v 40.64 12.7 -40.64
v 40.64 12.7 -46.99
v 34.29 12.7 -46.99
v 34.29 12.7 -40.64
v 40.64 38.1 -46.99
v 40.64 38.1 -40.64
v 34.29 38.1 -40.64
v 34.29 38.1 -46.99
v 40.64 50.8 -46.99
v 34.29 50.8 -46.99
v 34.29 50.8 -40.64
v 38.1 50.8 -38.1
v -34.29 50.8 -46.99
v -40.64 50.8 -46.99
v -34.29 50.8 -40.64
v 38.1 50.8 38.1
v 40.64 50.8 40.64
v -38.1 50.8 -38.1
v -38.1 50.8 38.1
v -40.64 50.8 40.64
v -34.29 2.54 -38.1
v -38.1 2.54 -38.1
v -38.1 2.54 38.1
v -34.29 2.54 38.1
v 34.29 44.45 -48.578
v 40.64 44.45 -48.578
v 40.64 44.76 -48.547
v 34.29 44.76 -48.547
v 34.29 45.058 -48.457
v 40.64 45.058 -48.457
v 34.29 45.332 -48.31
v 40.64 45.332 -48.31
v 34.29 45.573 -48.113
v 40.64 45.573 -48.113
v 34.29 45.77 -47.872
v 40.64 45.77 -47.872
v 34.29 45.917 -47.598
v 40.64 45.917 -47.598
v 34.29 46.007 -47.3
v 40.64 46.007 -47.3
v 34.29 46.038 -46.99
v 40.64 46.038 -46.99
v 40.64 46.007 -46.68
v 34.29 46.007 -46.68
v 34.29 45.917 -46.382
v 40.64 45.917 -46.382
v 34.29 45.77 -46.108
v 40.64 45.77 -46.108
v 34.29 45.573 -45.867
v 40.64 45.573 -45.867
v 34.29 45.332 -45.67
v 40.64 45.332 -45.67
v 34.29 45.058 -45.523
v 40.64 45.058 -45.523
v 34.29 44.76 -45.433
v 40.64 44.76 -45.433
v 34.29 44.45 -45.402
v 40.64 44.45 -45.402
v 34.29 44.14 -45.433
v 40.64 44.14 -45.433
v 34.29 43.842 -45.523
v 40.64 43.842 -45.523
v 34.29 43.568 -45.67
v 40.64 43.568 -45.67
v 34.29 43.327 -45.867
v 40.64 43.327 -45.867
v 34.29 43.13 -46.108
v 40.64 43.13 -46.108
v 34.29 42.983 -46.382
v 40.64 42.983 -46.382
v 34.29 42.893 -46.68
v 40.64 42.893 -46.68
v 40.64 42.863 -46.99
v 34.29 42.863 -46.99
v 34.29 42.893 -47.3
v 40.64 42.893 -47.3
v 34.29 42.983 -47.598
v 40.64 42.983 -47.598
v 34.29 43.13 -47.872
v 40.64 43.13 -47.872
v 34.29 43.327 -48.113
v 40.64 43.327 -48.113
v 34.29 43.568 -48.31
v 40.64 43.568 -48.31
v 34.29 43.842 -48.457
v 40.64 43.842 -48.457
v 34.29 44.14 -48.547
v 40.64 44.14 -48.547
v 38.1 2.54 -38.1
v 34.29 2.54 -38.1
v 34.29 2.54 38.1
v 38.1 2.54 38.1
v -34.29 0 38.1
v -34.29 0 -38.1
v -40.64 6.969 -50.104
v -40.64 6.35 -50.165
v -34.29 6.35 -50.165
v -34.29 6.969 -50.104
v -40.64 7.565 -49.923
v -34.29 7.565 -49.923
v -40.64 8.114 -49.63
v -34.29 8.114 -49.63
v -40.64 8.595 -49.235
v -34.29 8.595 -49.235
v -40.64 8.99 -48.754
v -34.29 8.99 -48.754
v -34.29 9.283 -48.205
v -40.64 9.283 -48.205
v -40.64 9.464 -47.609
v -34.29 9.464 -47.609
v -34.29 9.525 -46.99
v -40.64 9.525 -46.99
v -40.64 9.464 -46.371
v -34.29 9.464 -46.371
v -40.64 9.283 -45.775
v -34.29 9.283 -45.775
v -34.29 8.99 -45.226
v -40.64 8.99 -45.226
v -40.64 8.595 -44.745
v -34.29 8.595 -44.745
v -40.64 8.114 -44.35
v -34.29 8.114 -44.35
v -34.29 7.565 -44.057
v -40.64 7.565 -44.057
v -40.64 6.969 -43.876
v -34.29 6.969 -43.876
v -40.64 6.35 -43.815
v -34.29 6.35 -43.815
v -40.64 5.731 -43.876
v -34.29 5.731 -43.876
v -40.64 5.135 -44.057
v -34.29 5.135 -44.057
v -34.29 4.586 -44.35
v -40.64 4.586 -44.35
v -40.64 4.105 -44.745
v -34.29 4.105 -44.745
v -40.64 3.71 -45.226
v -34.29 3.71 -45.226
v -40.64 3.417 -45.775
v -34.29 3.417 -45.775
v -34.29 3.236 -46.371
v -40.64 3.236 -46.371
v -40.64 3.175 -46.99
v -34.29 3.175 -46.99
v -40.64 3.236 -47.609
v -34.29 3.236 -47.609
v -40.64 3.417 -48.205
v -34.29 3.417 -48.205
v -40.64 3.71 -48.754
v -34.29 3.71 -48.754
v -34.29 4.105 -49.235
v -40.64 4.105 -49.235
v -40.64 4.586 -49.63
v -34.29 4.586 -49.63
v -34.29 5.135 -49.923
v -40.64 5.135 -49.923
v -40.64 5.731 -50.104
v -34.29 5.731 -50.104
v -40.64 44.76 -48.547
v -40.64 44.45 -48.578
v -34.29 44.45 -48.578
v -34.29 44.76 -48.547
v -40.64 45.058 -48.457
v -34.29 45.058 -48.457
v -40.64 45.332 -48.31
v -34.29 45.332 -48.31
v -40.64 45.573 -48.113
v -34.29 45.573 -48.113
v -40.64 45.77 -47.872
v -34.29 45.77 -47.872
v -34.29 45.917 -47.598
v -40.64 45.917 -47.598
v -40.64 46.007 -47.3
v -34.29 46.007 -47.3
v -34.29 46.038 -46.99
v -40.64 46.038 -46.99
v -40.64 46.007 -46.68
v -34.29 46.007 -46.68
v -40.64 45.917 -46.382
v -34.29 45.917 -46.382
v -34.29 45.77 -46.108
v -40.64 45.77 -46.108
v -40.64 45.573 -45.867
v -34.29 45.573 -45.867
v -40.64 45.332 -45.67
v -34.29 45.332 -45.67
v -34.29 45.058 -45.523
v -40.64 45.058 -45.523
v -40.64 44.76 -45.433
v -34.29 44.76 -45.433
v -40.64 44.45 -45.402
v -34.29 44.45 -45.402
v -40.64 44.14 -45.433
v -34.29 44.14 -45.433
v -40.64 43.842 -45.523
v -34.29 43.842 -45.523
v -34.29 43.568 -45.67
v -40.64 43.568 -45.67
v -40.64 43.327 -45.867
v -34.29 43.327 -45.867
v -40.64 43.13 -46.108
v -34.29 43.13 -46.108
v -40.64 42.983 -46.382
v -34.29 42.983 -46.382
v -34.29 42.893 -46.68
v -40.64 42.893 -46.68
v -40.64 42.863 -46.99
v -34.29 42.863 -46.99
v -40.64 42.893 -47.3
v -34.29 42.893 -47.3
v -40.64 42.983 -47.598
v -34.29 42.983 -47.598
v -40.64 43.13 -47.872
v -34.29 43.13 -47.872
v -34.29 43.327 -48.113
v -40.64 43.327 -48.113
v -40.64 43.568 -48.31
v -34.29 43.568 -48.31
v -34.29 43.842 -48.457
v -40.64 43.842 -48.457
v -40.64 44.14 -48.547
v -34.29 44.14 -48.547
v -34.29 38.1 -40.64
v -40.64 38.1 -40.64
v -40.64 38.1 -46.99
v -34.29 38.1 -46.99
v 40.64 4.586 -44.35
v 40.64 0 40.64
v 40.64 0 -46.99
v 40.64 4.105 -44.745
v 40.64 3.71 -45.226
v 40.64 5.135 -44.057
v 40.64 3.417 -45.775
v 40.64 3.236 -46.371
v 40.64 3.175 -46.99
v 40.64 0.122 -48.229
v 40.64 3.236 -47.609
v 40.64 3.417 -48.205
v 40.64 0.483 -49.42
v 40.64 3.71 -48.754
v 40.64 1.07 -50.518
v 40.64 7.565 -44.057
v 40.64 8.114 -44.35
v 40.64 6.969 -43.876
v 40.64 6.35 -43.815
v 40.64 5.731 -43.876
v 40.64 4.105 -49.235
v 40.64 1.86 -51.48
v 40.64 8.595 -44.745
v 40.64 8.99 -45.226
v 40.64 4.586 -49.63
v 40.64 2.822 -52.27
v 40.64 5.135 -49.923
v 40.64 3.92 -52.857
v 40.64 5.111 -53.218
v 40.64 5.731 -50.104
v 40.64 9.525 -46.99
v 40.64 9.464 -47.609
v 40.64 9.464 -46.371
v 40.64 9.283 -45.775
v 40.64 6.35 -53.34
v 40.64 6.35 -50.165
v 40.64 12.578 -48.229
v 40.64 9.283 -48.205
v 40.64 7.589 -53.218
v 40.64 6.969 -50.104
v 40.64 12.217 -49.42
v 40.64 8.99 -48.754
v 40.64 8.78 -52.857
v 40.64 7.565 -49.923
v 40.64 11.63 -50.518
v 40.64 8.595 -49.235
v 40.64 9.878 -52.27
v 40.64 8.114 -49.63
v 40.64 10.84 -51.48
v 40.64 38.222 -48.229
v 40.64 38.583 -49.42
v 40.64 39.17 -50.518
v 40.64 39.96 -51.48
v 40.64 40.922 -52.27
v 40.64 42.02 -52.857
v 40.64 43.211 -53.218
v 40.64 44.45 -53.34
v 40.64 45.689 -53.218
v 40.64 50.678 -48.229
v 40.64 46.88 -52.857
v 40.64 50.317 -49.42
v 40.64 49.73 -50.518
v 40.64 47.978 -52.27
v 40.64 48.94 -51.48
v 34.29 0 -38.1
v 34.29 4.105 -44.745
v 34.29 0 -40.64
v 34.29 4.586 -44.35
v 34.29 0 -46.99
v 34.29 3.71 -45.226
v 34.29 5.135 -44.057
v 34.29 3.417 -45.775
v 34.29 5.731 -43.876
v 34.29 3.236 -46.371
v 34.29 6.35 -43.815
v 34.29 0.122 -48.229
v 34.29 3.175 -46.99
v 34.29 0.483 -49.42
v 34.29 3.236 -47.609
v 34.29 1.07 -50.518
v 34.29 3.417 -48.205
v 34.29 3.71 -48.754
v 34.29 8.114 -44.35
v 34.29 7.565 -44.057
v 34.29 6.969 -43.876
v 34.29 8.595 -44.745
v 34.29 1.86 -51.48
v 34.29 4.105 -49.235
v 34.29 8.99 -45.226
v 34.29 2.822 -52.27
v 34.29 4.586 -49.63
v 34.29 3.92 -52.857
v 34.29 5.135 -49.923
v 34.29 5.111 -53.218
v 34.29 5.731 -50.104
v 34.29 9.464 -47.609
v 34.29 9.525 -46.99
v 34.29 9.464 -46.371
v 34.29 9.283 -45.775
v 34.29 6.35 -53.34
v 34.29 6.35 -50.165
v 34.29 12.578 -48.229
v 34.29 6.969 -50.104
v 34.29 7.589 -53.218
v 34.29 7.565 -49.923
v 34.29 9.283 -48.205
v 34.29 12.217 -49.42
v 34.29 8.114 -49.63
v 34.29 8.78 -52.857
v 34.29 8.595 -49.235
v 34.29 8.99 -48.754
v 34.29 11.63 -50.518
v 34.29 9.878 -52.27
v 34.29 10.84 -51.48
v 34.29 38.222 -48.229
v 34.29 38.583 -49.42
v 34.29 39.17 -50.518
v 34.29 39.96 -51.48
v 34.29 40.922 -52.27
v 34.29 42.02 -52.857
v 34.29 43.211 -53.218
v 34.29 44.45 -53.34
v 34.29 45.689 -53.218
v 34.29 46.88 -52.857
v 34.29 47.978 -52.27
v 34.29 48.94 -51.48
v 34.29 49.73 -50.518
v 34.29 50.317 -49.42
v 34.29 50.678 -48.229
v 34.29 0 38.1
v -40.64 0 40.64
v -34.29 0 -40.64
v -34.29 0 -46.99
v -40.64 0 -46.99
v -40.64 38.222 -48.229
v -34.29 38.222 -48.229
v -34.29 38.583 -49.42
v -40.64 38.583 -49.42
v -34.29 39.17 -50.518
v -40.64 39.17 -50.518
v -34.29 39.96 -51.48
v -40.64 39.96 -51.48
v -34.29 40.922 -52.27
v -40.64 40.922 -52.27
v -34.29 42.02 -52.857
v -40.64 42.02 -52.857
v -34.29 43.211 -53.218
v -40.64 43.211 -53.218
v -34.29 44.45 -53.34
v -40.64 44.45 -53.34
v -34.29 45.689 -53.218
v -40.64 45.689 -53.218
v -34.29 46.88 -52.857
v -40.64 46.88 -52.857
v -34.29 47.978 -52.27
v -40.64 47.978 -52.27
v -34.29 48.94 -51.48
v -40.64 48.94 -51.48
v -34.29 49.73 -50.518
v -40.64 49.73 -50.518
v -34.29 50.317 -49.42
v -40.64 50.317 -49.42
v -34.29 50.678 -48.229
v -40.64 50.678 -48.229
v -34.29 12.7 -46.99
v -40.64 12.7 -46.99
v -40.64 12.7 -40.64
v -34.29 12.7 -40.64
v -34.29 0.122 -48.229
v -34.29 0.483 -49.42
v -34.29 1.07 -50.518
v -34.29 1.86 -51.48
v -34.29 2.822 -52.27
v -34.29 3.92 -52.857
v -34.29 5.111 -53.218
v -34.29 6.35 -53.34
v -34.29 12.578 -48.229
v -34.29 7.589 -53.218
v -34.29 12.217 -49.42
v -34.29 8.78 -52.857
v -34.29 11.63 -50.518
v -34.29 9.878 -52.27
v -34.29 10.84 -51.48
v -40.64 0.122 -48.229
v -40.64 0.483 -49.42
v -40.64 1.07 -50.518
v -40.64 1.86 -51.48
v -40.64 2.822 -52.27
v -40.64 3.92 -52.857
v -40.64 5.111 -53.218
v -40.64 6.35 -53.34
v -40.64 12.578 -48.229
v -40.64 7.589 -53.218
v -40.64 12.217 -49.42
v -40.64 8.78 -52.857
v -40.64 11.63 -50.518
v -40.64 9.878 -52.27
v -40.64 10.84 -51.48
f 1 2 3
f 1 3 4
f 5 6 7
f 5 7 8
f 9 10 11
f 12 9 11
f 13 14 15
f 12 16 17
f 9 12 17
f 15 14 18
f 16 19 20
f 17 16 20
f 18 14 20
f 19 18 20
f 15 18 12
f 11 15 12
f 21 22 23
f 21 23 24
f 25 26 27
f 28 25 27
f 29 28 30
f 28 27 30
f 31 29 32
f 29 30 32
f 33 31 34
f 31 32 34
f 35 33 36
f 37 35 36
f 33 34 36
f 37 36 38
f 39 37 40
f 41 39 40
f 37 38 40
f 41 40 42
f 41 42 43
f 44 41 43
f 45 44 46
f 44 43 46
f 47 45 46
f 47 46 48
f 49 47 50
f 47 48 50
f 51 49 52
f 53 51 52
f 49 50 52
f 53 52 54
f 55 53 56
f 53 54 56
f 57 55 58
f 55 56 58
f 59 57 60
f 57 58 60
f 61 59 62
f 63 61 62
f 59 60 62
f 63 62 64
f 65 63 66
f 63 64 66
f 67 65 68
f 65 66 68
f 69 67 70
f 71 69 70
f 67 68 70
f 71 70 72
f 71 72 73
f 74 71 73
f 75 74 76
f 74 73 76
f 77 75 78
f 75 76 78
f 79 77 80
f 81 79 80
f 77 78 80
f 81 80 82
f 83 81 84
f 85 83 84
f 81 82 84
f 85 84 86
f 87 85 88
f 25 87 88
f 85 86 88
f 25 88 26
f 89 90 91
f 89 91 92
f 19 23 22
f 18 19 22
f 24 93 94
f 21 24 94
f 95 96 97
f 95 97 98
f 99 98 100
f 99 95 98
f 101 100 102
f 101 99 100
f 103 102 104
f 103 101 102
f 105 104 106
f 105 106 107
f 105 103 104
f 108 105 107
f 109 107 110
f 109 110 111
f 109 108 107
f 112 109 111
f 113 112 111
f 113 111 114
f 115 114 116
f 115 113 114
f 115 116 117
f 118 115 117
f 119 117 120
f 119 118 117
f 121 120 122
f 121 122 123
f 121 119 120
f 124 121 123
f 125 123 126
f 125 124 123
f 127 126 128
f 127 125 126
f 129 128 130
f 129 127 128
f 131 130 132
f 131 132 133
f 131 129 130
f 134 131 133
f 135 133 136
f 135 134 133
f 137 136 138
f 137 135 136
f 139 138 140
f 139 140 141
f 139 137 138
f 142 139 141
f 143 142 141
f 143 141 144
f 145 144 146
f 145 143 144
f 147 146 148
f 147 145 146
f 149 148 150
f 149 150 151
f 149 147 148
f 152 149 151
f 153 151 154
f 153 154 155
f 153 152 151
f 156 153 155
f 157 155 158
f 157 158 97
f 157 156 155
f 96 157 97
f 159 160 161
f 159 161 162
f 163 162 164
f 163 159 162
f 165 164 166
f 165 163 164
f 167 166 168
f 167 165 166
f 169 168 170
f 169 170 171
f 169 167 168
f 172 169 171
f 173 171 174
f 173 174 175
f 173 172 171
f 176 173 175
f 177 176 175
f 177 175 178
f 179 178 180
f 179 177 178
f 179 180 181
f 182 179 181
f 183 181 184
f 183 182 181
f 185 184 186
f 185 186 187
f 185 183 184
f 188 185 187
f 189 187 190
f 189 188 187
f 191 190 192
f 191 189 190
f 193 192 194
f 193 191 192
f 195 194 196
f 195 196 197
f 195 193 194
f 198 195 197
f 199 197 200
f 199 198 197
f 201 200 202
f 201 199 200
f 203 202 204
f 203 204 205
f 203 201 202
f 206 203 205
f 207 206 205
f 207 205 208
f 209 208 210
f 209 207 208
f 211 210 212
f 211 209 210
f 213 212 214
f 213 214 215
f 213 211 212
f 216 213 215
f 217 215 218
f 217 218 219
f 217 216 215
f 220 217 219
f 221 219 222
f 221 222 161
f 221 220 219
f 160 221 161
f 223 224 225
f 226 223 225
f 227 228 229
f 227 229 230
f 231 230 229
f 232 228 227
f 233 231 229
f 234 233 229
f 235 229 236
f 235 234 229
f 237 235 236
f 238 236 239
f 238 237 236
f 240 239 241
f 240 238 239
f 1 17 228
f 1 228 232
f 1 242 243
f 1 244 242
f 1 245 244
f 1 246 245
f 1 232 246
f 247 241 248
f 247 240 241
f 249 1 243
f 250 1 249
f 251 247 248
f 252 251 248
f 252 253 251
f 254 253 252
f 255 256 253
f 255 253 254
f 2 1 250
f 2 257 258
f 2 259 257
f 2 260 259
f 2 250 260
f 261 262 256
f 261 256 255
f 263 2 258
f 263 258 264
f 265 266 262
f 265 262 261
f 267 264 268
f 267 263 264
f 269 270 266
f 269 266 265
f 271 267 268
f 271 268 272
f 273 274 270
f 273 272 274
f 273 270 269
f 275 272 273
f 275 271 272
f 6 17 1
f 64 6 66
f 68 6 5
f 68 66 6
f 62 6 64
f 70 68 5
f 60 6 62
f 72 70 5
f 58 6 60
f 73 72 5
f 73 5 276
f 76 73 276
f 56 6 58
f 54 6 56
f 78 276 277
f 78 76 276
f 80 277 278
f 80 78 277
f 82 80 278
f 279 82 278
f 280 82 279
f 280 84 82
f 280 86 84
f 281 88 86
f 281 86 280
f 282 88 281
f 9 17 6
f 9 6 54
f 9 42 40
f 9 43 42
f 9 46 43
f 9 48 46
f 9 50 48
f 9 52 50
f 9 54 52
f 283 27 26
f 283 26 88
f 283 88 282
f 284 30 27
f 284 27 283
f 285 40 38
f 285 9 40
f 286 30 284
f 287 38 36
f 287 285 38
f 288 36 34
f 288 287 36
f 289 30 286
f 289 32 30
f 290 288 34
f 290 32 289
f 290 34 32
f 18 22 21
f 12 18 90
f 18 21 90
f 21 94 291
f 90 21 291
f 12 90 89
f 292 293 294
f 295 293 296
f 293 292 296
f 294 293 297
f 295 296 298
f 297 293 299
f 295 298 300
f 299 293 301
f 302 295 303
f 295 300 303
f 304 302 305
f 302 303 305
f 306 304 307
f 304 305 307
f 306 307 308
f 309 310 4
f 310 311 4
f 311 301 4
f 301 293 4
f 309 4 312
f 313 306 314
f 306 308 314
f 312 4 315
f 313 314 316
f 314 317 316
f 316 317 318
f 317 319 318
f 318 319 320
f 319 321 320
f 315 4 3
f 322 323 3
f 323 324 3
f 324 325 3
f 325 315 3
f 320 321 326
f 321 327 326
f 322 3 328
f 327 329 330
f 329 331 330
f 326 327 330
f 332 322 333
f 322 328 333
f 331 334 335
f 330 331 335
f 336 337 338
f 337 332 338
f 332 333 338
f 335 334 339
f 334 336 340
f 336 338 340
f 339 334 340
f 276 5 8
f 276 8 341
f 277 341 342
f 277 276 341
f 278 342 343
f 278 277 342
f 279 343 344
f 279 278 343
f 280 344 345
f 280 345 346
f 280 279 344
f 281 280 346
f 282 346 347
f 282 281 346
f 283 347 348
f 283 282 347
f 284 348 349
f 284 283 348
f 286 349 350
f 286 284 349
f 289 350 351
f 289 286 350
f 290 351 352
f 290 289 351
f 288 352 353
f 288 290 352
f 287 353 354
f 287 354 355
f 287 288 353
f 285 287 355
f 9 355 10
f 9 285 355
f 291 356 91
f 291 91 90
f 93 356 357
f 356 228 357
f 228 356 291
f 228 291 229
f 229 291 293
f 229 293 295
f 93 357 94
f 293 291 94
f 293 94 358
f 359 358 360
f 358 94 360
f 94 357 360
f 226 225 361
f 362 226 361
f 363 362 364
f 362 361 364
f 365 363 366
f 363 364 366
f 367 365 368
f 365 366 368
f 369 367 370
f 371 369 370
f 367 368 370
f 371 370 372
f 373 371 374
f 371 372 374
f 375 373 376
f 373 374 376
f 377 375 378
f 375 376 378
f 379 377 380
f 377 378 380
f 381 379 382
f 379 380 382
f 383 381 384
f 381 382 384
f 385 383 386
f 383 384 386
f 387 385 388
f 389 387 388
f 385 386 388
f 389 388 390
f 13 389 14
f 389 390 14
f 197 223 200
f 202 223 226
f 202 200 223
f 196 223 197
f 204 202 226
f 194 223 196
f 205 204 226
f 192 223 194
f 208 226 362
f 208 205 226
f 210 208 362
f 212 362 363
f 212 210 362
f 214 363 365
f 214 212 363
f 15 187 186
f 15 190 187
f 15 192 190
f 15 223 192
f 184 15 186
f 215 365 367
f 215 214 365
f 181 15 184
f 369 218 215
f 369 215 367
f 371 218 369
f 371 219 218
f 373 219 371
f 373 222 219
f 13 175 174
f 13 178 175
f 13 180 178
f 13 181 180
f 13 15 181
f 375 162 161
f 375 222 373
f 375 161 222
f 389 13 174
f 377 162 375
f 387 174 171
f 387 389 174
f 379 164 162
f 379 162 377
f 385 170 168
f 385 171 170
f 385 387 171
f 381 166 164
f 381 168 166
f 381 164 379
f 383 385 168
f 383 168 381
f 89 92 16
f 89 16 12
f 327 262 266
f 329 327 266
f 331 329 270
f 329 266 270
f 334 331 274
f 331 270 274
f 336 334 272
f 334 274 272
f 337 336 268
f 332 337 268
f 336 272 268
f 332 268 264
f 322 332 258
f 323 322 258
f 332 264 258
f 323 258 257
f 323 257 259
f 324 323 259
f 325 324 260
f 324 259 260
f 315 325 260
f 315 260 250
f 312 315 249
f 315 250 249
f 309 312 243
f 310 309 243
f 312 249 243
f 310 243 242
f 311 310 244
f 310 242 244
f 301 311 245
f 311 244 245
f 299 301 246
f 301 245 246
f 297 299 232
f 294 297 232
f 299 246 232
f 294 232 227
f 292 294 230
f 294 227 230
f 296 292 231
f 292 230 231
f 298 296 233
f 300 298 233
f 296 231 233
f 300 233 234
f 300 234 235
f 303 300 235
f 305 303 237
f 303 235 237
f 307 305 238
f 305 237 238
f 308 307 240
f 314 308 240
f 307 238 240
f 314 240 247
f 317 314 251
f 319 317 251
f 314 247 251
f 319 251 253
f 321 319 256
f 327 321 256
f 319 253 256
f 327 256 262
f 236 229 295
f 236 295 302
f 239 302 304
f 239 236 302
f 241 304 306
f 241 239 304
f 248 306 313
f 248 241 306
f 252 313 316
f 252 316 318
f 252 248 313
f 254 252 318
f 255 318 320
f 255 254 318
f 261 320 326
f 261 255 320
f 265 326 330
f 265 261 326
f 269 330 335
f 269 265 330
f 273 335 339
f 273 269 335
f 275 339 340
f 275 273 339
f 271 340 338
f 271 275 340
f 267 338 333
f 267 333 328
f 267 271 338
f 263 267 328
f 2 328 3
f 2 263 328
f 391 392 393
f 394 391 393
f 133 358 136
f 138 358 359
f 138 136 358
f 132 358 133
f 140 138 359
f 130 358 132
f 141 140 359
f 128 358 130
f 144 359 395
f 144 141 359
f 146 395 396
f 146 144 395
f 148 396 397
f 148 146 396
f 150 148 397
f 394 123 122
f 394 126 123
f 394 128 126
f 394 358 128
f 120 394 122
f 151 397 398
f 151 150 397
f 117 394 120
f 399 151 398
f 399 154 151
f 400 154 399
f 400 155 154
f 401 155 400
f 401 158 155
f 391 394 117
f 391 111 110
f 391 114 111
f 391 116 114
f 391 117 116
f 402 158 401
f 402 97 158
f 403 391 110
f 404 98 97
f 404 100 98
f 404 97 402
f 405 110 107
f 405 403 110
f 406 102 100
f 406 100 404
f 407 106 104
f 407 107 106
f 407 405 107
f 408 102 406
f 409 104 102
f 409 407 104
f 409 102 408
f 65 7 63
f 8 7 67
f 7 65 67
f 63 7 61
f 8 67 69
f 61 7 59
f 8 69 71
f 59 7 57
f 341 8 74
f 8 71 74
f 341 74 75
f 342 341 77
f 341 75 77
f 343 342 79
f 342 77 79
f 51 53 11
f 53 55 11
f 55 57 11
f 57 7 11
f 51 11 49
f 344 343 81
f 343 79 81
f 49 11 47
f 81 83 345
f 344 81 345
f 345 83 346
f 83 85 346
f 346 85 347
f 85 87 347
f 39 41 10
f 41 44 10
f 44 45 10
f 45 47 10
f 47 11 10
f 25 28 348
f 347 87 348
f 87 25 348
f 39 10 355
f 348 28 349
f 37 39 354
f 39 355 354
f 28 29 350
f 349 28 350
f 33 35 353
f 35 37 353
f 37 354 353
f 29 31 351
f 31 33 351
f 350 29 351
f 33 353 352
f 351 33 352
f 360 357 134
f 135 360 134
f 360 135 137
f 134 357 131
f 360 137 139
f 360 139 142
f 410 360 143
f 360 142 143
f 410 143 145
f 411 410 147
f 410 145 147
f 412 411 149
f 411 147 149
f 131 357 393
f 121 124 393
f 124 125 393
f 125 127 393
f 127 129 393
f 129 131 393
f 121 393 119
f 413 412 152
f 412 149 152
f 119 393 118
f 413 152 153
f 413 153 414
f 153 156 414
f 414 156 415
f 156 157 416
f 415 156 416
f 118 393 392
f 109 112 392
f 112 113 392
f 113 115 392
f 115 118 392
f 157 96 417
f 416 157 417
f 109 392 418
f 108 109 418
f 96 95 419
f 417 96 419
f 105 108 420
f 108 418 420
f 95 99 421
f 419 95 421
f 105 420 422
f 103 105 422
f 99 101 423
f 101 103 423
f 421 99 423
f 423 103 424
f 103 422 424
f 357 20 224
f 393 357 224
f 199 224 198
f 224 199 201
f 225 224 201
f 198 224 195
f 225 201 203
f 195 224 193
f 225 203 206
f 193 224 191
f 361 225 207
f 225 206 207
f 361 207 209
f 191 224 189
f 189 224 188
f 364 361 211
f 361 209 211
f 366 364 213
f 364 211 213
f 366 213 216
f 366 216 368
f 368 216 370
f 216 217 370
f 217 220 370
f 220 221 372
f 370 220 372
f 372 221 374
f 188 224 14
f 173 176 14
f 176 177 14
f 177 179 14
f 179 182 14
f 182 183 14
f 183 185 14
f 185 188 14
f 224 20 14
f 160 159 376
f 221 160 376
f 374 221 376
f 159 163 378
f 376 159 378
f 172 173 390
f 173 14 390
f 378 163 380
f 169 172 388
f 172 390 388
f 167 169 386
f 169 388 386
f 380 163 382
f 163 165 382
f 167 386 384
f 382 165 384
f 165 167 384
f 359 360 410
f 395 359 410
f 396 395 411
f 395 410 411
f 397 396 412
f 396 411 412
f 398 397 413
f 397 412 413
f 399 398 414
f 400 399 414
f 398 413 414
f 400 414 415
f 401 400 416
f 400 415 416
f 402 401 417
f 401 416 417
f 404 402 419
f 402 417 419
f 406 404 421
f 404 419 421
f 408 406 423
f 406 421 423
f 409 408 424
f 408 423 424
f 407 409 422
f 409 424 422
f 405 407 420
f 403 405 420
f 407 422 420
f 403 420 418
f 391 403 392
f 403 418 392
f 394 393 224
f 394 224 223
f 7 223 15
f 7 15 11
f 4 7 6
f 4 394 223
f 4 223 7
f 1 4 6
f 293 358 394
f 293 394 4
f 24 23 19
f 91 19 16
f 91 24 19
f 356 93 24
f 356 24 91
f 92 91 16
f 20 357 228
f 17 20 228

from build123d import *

# Parameters (mm, degrees)
SKETCH1_W           = 81.28
SKETCH1_H           = 81.28
SKETCH1_W_2         = 76.2
SKETCH1_H_2         = 76.2
BOSS_EXTRUDE1_DEPTH = 50.8
SKETCH2_W           = 3.81
SKETCH2_H           = 76.2
BOSS_EXTRUDE2_DEPTH = 2.54
SKETCH3_R           = 3.175
BOSS_EXTRUDE3_DEPTH = 6.35
SKETCH4_R           = 1.5875
BOSS_EXTRUDE4_DEPTH = 6.35


with BuildPart() as part:
    # Sketch1 → Boss-Extrude1 (new body)
    with BuildSketch(Plane(origin=(0, 0, 0), x_dir=(1, 0, 0), z_dir=(0, 1, 0))):
        Rectangle(SKETCH1_W, SKETCH1_H)
        Rectangle(SKETCH1_W_2, SKETCH1_H_2, mode=Mode.SUBTRACT)
    extrude(amount=BOSS_EXTRUDE1_DEPTH)

    # Sketch2 → Boss-Extrude2 (add)
    with BuildSketch(Plane(origin=(0, 0, 0), x_dir=(1, 0, 0), z_dir=(0, 1, 0))):
        with Locations((-36.195, 0)):
            Rectangle(SKETCH2_W, SKETCH2_H)
        with Locations((36.195, 0)):
            Rectangle(SKETCH2_W, SKETCH2_H)
    extrude(amount=BOSS_EXTRUDE2_DEPTH)

    # Sketch3 → Boss-Extrude3 (add)
    with BuildSketch(Plane(origin=(40.64, 0, 0), x_dir=(0, 0, -1), z_dir=(1, 0, 0))):
        with BuildLine():
            Line((46.99, 12.7), (40.64, 12.7))
            Line((40.64, 12.7), (40.64, 0))
            Line((40.64, 0), (46.99, 0))
            ThreePointArc((46.99, 0), (53.34, 6.35), (46.99, 12.7))
        make_face()
        with Locations((46.99, 6.35)):
            Circle(SKETCH3_R, mode=Mode.SUBTRACT)
    boss_extrude3 = extrude(amount=-BOSS_EXTRUDE3_DEPTH)

    # Sketch4 → Boss-Extrude4 (add)
    with BuildSketch(Plane(origin=(40.64, 0, 0), x_dir=(0, 0, -1), z_dir=(1, 0, 0))):
        with BuildLine():
            Line((46.99, 50.8), (40.64, 50.8))
            Line((40.64, 50.8), (40.64, 38.1))
            Line((40.64, 38.1), (46.99, 38.1))
            ThreePointArc((46.99, 38.1), (53.34, 44.45), (46.99, 50.8))
        make_face()
        with Locations((46.99, 44.45)):
            Circle(SKETCH4_R, mode=Mode.SUBTRACT)
    boss_extrude4 = extrude(amount=-BOSS_EXTRUDE4_DEPTH)

    # Mirror1: Boss-Extrude3, Boss-Extrude4 across plane
    add(boss_extrude3.mirror(Plane.ZY))
    add(boss_extrude4.mirror(Plane.ZY))


solid = part.part
